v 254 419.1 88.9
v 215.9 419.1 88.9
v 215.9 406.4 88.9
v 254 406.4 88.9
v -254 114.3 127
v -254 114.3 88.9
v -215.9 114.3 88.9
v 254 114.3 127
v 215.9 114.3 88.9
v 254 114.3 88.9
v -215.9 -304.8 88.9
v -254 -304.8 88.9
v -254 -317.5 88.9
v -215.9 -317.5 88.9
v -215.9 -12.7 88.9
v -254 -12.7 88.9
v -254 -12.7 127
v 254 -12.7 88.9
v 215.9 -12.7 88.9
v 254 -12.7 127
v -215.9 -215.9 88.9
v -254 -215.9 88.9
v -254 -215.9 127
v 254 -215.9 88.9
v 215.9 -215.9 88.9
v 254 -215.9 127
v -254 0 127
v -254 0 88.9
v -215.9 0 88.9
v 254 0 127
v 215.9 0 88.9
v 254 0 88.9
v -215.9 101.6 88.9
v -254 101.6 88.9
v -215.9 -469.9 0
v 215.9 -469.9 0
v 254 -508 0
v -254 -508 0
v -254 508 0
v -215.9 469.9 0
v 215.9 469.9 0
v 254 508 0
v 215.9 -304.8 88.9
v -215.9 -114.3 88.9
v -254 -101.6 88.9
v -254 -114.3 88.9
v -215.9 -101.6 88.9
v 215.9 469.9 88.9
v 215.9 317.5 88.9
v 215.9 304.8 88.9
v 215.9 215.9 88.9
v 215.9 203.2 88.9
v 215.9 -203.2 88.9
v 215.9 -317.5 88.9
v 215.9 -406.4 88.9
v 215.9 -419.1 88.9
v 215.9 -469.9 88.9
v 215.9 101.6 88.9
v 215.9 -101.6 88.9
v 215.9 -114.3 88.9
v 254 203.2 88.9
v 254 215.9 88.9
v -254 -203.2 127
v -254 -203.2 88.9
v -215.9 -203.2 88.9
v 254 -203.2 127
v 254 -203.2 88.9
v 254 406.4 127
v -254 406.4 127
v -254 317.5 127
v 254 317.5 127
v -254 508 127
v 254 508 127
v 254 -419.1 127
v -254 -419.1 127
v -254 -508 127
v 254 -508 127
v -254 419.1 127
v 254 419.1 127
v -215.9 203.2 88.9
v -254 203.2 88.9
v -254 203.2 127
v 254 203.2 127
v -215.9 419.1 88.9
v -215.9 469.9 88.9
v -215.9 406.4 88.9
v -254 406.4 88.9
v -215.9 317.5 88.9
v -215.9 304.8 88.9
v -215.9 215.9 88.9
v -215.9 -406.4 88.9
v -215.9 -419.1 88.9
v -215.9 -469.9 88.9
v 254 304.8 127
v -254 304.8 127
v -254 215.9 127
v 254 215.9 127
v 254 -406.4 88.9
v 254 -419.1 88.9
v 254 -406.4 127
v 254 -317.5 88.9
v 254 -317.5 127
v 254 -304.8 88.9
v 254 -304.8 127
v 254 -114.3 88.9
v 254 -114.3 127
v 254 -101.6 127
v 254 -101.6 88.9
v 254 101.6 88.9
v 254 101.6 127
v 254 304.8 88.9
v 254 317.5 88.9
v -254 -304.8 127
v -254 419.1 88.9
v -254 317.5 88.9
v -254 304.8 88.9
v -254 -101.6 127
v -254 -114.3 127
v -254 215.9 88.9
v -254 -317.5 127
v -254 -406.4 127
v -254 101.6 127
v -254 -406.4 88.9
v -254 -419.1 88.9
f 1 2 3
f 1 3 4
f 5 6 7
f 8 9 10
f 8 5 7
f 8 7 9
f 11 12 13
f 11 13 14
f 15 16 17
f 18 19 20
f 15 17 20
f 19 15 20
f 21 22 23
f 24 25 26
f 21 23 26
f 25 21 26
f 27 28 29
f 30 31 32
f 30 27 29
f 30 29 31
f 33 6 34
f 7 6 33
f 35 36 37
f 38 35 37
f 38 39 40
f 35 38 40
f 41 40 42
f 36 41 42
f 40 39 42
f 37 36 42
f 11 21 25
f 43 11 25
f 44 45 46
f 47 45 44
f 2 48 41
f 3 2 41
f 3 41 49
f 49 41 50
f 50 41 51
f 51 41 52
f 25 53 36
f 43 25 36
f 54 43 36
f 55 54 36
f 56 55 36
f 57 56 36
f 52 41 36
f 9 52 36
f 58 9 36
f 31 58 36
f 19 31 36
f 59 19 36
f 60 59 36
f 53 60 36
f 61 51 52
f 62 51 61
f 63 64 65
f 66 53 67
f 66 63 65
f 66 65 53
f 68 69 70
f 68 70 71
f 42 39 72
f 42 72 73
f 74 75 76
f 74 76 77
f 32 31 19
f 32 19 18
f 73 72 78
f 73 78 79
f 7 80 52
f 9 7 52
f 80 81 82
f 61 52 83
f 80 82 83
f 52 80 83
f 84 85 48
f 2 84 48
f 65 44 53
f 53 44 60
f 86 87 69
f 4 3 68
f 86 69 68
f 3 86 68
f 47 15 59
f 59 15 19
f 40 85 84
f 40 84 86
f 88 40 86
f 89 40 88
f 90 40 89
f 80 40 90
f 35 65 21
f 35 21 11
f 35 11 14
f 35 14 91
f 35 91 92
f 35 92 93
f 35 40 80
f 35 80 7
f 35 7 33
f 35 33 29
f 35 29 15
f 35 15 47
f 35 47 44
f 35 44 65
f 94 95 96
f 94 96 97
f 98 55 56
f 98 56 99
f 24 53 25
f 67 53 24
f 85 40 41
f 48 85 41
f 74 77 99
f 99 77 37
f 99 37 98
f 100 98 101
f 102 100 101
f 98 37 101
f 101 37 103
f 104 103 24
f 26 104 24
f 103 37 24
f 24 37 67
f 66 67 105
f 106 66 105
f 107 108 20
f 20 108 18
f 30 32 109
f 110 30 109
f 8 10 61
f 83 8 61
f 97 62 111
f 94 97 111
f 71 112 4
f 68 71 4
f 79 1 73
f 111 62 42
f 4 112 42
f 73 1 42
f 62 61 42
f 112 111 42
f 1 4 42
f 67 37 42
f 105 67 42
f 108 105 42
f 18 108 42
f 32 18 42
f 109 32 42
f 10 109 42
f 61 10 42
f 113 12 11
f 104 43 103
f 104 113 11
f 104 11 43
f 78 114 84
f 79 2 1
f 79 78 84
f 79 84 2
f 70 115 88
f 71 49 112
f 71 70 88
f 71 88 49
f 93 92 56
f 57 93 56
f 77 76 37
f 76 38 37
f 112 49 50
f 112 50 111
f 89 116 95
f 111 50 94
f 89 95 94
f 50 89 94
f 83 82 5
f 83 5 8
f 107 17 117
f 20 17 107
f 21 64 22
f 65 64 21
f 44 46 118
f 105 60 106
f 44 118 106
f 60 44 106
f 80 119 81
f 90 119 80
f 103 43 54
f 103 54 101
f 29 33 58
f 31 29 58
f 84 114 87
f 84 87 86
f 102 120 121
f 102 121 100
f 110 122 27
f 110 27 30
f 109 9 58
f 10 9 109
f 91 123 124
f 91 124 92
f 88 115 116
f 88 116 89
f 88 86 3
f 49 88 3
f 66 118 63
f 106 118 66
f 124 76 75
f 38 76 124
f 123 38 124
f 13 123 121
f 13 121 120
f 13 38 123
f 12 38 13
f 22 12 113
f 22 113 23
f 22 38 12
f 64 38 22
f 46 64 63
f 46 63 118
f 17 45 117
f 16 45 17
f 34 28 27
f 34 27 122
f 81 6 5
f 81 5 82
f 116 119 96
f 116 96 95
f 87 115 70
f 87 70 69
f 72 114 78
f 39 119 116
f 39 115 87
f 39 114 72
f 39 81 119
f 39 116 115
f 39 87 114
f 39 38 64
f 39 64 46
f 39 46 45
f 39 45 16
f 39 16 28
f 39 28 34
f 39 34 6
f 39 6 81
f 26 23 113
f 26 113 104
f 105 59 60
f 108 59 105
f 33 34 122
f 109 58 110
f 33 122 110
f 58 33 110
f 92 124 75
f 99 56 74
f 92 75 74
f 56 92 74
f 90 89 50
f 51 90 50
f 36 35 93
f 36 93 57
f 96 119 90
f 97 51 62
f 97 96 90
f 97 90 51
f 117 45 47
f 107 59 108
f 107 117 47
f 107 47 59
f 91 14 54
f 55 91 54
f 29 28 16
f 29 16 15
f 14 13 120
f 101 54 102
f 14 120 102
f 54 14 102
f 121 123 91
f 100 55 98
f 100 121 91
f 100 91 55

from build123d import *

# Parameters (mm, degrees)
F0_W     = 508
F0_H     = 1016
F1_DEPTH = 88.9
F2_W     = 431.8
F2_H     = 939.8
F6_DEPTH = 88.9
F3_W     = 508
F3_H     = 1016
F4_DEPTH = 38.1
F5_W     = 508
F5_H     = 12.7
F7_DEPTH = 38.1


with BuildPart() as f1:
    # F0 (on Top) → F1 (new body)
    with BuildSketch(Plane.XY):
        Rectangle(F0_W, F0_H)
    extrude(amount=F1_DEPTH)

    # F2 (on face) → F6 (cut)
    with BuildSketch(Plane(origin=(0, 0, 0), x_dir=(1, 0, 0), z_dir=(0, 0, -1))):
        Rectangle(F2_W, F2_H)
    extrude(amount=-F6_DEPTH, mode=Mode.SUBTRACT)

    # F3 (on face) → F4 (join)
    with BuildSketch(Plane.XY.offset(88.9)):
        Rectangle(F3_W, F3_H)
    extrude(amount=F4_DEPTH)

    # F5 (on face) → F7 (cut)
    with BuildSketch(Plane.XY.offset(127)):
        with Locations((0, 412.75)):
            Rectangle(F5_W, F5_H)
        with Locations((0, 311.15)):
            Rectangle(F5_W, F5_H)
        with Locations((0, 209.55)):
            Rectangle(F5_W, F5_H)
        with Locations((0, 107.95)):
            Rectangle(F5_W, F5_H)
        with Locations((0, -6.35)):
            Rectangle(F5_W, F5_H)
        with Locations((0, -107.95)):
            Rectangle(F5_W, F5_H)
        with Locations((0, -209.55)):
            Rectangle(F5_W, F5_H)
        with Locations((0, -311.15)):
            Rectangle(F5_W, F5_H)
        with Locations((0, -412.75)):
            Rectangle(F5_W, F5_H)
    extrude(amount=-F7_DEPTH, mode=Mode.SUBTRACT)


solid = f1.part
